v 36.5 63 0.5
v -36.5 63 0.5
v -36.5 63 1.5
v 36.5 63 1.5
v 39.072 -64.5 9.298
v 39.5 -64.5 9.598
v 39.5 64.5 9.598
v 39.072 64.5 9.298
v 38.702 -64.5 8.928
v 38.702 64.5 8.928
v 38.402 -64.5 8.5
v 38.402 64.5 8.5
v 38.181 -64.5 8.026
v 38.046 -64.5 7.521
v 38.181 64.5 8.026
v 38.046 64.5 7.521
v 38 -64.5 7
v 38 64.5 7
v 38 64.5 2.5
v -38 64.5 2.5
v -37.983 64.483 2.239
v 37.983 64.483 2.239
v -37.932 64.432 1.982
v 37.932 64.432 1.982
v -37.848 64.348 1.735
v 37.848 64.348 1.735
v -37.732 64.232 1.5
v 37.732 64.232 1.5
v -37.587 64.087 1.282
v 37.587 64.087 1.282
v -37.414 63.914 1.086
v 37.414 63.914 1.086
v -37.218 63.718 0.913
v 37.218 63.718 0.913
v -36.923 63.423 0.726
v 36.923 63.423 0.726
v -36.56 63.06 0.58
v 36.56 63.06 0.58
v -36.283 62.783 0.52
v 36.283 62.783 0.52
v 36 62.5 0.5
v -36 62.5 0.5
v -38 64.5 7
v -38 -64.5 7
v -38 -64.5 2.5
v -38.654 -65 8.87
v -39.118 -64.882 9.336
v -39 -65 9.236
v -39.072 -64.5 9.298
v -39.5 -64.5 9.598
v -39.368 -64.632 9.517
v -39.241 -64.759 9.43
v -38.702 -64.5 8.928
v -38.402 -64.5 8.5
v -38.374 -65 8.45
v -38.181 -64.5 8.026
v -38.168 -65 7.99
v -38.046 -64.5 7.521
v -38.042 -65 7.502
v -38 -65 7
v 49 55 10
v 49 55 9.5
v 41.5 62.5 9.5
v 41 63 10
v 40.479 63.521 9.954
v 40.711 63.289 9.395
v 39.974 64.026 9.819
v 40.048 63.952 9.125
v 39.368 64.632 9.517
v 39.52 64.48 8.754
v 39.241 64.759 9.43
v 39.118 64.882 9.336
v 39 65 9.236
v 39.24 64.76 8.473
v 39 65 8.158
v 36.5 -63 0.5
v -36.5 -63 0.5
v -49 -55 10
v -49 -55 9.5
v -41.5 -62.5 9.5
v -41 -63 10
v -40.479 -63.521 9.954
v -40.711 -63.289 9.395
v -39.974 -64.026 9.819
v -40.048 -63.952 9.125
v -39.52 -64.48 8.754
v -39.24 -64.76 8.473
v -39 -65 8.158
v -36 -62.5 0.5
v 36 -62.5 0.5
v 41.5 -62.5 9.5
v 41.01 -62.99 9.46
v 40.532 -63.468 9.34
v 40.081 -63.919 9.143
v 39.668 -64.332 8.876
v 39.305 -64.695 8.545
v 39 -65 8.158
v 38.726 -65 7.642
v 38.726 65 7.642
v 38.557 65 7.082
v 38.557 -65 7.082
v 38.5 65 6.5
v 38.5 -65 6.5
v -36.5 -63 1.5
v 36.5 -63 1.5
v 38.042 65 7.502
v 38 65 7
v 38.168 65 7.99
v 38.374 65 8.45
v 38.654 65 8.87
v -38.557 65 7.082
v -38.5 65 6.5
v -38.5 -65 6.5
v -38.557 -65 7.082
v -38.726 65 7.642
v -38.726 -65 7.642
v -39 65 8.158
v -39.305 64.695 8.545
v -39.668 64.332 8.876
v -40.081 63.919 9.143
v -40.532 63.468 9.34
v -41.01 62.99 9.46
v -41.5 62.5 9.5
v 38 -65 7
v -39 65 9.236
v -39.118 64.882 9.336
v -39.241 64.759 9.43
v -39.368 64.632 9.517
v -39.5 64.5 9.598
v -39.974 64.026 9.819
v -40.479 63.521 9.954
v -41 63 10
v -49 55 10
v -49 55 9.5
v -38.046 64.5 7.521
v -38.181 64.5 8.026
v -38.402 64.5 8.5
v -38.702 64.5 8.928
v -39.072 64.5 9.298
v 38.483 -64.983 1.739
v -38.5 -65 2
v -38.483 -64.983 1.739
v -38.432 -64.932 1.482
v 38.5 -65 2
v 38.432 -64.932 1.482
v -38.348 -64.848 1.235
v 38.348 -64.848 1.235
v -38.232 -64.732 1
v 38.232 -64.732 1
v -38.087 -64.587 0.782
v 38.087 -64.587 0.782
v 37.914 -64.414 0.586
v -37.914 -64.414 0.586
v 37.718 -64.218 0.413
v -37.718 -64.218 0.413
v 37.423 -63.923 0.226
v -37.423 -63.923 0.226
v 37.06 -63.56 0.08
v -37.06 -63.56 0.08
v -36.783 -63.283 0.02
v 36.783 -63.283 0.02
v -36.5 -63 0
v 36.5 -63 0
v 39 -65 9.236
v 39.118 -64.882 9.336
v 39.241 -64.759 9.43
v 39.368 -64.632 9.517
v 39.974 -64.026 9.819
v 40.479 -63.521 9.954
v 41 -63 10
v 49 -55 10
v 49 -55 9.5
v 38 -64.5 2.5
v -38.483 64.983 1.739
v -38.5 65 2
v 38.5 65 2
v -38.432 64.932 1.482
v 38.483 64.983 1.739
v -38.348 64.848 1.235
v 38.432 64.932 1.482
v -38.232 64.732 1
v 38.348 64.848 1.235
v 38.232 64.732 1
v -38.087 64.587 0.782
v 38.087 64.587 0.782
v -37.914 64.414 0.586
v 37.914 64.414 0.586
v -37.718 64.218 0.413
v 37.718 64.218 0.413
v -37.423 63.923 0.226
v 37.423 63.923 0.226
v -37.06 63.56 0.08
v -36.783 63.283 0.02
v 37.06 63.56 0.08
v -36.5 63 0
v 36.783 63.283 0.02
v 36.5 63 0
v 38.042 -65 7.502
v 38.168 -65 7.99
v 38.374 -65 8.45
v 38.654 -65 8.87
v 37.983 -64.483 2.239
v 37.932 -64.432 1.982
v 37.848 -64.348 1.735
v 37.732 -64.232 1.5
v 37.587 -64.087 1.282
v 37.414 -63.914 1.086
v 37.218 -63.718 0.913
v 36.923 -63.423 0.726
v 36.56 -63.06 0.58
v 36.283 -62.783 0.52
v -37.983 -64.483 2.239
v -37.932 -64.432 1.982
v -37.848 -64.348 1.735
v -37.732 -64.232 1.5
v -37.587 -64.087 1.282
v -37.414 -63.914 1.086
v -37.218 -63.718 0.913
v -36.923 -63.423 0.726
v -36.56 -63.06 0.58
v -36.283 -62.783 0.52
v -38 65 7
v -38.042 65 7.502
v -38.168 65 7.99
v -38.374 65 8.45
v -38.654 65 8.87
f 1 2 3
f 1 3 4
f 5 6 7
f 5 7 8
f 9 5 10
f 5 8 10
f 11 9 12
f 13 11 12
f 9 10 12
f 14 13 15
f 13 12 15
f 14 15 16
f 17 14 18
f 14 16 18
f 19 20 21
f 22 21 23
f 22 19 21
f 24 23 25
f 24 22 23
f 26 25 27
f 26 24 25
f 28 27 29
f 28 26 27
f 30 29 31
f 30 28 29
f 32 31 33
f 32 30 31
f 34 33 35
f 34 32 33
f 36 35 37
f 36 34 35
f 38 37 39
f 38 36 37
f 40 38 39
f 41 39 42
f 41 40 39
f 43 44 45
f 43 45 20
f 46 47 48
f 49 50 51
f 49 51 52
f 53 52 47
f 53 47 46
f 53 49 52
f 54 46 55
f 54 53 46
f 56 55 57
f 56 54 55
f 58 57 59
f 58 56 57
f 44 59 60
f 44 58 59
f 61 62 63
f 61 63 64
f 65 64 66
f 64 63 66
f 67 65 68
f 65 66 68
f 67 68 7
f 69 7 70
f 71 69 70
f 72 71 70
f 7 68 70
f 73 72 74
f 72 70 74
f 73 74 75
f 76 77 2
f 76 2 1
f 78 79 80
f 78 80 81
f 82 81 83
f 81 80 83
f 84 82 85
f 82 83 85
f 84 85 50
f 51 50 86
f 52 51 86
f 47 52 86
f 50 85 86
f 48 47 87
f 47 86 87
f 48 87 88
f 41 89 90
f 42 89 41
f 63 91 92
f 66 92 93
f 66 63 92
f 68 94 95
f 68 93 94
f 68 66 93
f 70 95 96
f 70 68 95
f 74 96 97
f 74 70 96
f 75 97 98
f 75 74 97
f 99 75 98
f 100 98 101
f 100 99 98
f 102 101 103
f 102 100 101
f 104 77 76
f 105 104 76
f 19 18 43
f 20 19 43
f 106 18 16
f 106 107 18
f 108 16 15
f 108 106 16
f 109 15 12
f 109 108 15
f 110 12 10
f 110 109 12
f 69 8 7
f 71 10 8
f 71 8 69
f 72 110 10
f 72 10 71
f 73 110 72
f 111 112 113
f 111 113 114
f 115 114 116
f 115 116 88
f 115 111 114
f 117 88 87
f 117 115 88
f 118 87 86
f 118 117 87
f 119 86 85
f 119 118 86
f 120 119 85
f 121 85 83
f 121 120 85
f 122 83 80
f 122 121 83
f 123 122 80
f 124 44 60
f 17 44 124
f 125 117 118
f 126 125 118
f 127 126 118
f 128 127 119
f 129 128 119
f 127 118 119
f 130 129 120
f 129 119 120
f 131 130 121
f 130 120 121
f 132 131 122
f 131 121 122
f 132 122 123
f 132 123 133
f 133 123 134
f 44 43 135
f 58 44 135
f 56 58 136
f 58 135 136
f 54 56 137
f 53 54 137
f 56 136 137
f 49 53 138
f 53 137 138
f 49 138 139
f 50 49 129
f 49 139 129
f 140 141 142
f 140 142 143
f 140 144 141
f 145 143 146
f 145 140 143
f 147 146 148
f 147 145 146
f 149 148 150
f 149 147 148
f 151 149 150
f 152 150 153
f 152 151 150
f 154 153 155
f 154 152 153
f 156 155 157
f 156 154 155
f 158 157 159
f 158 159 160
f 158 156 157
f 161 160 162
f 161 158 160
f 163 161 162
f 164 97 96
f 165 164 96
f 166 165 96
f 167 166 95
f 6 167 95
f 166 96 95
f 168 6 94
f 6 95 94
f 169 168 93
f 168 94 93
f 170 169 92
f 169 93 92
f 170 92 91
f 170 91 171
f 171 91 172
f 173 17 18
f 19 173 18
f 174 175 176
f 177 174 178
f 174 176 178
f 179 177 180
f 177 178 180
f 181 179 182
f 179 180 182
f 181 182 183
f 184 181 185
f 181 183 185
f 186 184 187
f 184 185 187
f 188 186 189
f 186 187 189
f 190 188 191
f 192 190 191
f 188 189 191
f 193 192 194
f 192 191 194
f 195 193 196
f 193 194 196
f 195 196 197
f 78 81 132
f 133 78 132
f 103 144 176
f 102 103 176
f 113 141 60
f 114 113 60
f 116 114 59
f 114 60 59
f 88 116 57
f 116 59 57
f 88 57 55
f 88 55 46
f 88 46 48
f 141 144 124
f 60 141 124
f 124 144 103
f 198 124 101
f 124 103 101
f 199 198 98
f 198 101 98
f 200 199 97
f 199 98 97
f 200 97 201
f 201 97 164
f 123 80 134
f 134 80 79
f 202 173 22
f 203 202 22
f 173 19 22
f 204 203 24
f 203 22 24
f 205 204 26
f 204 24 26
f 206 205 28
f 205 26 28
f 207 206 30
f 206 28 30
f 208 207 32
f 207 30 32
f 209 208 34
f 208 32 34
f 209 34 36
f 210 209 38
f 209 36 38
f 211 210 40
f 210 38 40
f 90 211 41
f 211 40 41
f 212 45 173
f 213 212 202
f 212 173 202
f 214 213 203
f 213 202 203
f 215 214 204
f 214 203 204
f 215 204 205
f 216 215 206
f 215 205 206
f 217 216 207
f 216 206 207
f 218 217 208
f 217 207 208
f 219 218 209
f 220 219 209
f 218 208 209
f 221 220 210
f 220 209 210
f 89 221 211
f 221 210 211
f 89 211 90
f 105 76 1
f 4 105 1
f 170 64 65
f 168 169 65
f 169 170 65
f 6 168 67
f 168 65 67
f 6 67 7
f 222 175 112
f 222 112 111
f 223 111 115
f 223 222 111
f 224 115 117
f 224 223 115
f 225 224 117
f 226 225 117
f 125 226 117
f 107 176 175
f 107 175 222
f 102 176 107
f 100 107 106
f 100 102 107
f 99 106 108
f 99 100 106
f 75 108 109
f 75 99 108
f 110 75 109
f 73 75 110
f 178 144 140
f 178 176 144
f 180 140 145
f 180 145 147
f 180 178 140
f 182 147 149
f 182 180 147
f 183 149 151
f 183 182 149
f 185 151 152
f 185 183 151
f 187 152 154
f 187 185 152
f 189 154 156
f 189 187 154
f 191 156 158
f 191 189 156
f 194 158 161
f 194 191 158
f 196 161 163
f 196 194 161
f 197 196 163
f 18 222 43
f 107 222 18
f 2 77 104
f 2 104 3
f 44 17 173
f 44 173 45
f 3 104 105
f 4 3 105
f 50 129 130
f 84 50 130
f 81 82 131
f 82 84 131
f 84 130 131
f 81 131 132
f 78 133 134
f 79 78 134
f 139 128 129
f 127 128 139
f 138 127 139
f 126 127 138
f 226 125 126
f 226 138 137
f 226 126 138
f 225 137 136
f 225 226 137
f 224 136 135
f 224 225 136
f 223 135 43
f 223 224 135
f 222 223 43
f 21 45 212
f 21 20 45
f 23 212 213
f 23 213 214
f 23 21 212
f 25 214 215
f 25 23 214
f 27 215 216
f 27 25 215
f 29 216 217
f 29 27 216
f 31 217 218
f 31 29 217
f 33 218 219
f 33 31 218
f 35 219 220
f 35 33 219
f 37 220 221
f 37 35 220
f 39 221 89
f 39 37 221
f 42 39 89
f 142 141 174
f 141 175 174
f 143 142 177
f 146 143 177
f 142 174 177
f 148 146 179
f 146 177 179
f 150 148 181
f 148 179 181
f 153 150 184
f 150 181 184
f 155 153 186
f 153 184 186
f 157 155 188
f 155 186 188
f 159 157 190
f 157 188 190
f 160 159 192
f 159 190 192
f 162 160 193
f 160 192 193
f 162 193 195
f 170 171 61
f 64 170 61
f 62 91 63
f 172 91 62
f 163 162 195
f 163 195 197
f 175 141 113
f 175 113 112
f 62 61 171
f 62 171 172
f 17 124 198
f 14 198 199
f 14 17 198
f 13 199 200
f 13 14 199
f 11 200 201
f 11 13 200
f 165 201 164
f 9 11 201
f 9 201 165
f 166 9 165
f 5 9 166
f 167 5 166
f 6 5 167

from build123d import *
from build123d.topology import SkipClean

# Parameters (mm, degrees)
SKETCH1_W                = 77
SKETCH1_H                = 130
BOSS_EXTRUDE1_DEPTH      = 10
SKETCH2_W                = 0.5
SKETCH2_H                = 130
BOSS_EXTRUDE2_DEPTH      = 10.5
CHAMFER1_SIZE            = 10
CHAMFER1_OF_MIRROR1_SIZE = 10
SHELL1_START             = -38
SHELL1_OUTLINE_W         = 129
SHELL1_OUTLINE_H         = 9.5
SHELL1_DEPTH             = 76
FILLET1_R                = 2
FILLET2_R                = 3
CUT_EXTRUDE1_DEPTH       = 135.25
SKETCH4_W                = 73
SKETCH4_H                = 126
BOSS_EXTRUDE3_DEPTH      = 1


# Read off the part's stored shape, not the designer's step: Shell1
with BuildPart() as part:
    # Sketch1 → Boss-Extrude1 (new body)
    with BuildSketch(Plane.XY):
        Rectangle(SKETCH1_W, SKETCH1_H)
    extrude(amount=BOSS_EXTRUDE1_DEPTH)

    # Sketch2 → Boss-Extrude2 (add)
    with BuildSketch(Plane(origin=(38.5, 0, 0), x_dir=(0, 0, -1), z_dir=(1, 0, 0))):
        with Locations((-9.75, 0)):
            Rectangle(SKETCH2_W, SKETCH2_H)
    boss_extrude2 = extrude(amount=BOSS_EXTRUDE2_DEPTH)

    # Chamfer1
    chamfer1_edges = [part.edges().sort_by_distance(p)[0] for p in [
        (49, -65, 9.75),
        (49, 65, 9.75),
    ]]
    chamfer(chamfer1_edges, length=CHAMFER1_SIZE)

    # Mirror1: Boss-Extrude2 across plane
    add(boss_extrude2.mirror(Plane(origin=(0, 0, 0), x_dir=(0, 0, 1), z_dir=(1, 0, 0))))

    # Chamfer1 of Mirror1
    chamfer1_of_mirror1_edges = [part.edges().sort_by_distance(p)[0] for p in [
        (-49, -65, 9.75),
        (-49, 65, 9.75),
    ]]
    chamfer(chamfer1_of_mirror1_edges, length=CHAMFER1_OF_MIRROR1_SIZE)

    # Shell1 outline → Shell1 (cut)
    with BuildSketch(Plane.YZ.offset(SHELL1_START)):
        with Locations((0, 5.25)):
            Rectangle(SHELL1_OUTLINE_W, SHELL1_OUTLINE_H)
    extrude(amount=SHELL1_DEPTH, mode=Mode.SUBTRACT)

    # Fillet1
    fillet1_edges = [part.edges().sort_by_distance(p)[0] for p in [
        (0, -65, 0),
        (-38.5, 0, 0),
        (0, 65, 0),
        (38.5, 0, 0),
        (38, 0, 0.5),
        (0, 64.5, 0.5),
        (-38, 0, 0.5),
        (0, -64.5, 0.5),
    ]]
    fillet(fillet1_edges, radius=FILLET1_R)

    # Fillet2
    # the kernel refuses this fillet: 3 mm, written as the material it adds along each edge
    with BuildSketch(Plane(origin=(-38.5, 65, 9.5), x_dir=(0, 0, -1), z_dir=(0, -1, 0))) as fillet2_piece_1_section:
        with BuildLine():
            CenterArc((FILLET2_R, -FILLET2_R), FILLET2_R, 90, 90)
            Line((0, -FILLET2_R), (0, 0))
            Line((0, 0), (FILLET2_R, 0))
        make_face()
    fillet2_piece_1 = extrude(amount=130, mode=Mode.PRIVATE)
    fillet2_piece_1 = split(fillet2_piece_1, bisect_by=Plane(origin=(-71.583154454, 32.416845546, 8.827874623), z_dir=(0.7071067811865476, -0.7071067811865476, 0)), keep=Keep.TOP, mode=Mode.PRIVATE)
    fillet2_piece_1 = split(fillet2_piece_1, bisect_by=Plane(origin=(-71.583154454, -32.416845546, 8.827874623), z_dir=(0.7071067811865476, 0.7071067811865476, 0)), keep=Keep.TOP, mode=Mode.PRIVATE)
    add(fillet2_piece_1)
    with BuildSketch(Plane(origin=(38.5, 65, 9.5), x_dir=(0, 0, -1), z_dir=(0, -1, 0))) as fillet2_piece_2_section:
        with BuildLine():
            CenterArc((FILLET2_R, FILLET2_R), FILLET2_R, 180, 90)
            Line((0, FILLET2_R), (0, 0))
            Line((0, 0), (FILLET2_R, 0))
        make_face()
    fillet2_piece_2 = extrude(amount=130, mode=Mode.PRIVATE)
    fillet2_piece_2 = split(fillet2_piece_2, bisect_by=Plane(origin=(71.583154454, 32.416845546, 8.827874623), z_dir=(-0.7071067811865476, -0.7071067811865476, 0)), keep=Keep.TOP, mode=Mode.PRIVATE)
    fillet2_piece_2 = split(fillet2_piece_2, bisect_by=Plane(origin=(71.583154454, -32.416845546, 8.827874623), z_dir=(-0.7071067811865476, 0.7071067811865476, 0)), keep=Keep.TOP, mode=Mode.PRIVATE)
    add(fillet2_piece_2)
    # the kernel refuses this fillet: 3 mm, written as the material it takes off along each edge
    with BuildSketch(Plane(origin=(38, 64.5, 10), x_dir=(1, 0, 0), z_dir=(0, -1, 0))) as fillet2_2_piece_1:
        with BuildLine():
            CenterArc((FILLET2_R, -FILLET2_R), FILLET2_R, 90, 90)
            Line((0, -FILLET2_R), (0, 0))
            Line((0, 0), (FILLET2_R, 0))
        make_face()
    extrude(amount=129, mode=Mode.SUBTRACT)
    with BuildSketch(Plane(origin=(-38, 64.5, 10), x_dir=(-1, 0, 0), z_dir=(0, -1, 0))) as fillet2_2_piece_2:
        with BuildLine():
            CenterArc((FILLET2_R, FILLET2_R), FILLET2_R, 180, 90)
            Line((0, FILLET2_R), (0, 0))
            Line((0, 0), (FILLET2_R, 0))
        make_face()
    extrude(amount=129, mode=Mode.SUBTRACT)

    # Sketch3 → Cut-Extrude1 (cut, symmetric)
    with SkipClean():  # the faces are left unmerged after this step: merging them gives an invalid solid
        with BuildSketch(Plane(origin=(0, -64.5, 0), x_dir=(1, 0, 0), z_dir=(0, 1, 0))):
            with BuildLine():
                Line((-38, -7), (38, -7))
                ThreePointArc((38, -7), (38.401923789, -8.5), (39.5, -9.598076211))
                Line((39.5, -9.598076211), (39.5, -10))
                Line((39.5, -10), (-39.5, -10))
                Line((-39.5, -10), (-39.5, -9.598076211))
                ThreePointArc((-39.5, -9.598076211), (-38.401923789, -8.5), (-38, -7))
            make_face()
        extrude(amount=CUT_EXTRUDE1_DEPTH, both=True, mode=Mode.SUBTRACT)


with BuildPart() as body_2:
    # Sketch4 → Boss-Extrude3 (new body)
    with BuildSketch(Plane.XY.offset(0.5)):
        Rectangle(SKETCH4_W, SKETCH4_H)
    extrude(amount=BOSS_EXTRUDE3_DEPTH)


solid = Compound([part.part, body_2.part])
